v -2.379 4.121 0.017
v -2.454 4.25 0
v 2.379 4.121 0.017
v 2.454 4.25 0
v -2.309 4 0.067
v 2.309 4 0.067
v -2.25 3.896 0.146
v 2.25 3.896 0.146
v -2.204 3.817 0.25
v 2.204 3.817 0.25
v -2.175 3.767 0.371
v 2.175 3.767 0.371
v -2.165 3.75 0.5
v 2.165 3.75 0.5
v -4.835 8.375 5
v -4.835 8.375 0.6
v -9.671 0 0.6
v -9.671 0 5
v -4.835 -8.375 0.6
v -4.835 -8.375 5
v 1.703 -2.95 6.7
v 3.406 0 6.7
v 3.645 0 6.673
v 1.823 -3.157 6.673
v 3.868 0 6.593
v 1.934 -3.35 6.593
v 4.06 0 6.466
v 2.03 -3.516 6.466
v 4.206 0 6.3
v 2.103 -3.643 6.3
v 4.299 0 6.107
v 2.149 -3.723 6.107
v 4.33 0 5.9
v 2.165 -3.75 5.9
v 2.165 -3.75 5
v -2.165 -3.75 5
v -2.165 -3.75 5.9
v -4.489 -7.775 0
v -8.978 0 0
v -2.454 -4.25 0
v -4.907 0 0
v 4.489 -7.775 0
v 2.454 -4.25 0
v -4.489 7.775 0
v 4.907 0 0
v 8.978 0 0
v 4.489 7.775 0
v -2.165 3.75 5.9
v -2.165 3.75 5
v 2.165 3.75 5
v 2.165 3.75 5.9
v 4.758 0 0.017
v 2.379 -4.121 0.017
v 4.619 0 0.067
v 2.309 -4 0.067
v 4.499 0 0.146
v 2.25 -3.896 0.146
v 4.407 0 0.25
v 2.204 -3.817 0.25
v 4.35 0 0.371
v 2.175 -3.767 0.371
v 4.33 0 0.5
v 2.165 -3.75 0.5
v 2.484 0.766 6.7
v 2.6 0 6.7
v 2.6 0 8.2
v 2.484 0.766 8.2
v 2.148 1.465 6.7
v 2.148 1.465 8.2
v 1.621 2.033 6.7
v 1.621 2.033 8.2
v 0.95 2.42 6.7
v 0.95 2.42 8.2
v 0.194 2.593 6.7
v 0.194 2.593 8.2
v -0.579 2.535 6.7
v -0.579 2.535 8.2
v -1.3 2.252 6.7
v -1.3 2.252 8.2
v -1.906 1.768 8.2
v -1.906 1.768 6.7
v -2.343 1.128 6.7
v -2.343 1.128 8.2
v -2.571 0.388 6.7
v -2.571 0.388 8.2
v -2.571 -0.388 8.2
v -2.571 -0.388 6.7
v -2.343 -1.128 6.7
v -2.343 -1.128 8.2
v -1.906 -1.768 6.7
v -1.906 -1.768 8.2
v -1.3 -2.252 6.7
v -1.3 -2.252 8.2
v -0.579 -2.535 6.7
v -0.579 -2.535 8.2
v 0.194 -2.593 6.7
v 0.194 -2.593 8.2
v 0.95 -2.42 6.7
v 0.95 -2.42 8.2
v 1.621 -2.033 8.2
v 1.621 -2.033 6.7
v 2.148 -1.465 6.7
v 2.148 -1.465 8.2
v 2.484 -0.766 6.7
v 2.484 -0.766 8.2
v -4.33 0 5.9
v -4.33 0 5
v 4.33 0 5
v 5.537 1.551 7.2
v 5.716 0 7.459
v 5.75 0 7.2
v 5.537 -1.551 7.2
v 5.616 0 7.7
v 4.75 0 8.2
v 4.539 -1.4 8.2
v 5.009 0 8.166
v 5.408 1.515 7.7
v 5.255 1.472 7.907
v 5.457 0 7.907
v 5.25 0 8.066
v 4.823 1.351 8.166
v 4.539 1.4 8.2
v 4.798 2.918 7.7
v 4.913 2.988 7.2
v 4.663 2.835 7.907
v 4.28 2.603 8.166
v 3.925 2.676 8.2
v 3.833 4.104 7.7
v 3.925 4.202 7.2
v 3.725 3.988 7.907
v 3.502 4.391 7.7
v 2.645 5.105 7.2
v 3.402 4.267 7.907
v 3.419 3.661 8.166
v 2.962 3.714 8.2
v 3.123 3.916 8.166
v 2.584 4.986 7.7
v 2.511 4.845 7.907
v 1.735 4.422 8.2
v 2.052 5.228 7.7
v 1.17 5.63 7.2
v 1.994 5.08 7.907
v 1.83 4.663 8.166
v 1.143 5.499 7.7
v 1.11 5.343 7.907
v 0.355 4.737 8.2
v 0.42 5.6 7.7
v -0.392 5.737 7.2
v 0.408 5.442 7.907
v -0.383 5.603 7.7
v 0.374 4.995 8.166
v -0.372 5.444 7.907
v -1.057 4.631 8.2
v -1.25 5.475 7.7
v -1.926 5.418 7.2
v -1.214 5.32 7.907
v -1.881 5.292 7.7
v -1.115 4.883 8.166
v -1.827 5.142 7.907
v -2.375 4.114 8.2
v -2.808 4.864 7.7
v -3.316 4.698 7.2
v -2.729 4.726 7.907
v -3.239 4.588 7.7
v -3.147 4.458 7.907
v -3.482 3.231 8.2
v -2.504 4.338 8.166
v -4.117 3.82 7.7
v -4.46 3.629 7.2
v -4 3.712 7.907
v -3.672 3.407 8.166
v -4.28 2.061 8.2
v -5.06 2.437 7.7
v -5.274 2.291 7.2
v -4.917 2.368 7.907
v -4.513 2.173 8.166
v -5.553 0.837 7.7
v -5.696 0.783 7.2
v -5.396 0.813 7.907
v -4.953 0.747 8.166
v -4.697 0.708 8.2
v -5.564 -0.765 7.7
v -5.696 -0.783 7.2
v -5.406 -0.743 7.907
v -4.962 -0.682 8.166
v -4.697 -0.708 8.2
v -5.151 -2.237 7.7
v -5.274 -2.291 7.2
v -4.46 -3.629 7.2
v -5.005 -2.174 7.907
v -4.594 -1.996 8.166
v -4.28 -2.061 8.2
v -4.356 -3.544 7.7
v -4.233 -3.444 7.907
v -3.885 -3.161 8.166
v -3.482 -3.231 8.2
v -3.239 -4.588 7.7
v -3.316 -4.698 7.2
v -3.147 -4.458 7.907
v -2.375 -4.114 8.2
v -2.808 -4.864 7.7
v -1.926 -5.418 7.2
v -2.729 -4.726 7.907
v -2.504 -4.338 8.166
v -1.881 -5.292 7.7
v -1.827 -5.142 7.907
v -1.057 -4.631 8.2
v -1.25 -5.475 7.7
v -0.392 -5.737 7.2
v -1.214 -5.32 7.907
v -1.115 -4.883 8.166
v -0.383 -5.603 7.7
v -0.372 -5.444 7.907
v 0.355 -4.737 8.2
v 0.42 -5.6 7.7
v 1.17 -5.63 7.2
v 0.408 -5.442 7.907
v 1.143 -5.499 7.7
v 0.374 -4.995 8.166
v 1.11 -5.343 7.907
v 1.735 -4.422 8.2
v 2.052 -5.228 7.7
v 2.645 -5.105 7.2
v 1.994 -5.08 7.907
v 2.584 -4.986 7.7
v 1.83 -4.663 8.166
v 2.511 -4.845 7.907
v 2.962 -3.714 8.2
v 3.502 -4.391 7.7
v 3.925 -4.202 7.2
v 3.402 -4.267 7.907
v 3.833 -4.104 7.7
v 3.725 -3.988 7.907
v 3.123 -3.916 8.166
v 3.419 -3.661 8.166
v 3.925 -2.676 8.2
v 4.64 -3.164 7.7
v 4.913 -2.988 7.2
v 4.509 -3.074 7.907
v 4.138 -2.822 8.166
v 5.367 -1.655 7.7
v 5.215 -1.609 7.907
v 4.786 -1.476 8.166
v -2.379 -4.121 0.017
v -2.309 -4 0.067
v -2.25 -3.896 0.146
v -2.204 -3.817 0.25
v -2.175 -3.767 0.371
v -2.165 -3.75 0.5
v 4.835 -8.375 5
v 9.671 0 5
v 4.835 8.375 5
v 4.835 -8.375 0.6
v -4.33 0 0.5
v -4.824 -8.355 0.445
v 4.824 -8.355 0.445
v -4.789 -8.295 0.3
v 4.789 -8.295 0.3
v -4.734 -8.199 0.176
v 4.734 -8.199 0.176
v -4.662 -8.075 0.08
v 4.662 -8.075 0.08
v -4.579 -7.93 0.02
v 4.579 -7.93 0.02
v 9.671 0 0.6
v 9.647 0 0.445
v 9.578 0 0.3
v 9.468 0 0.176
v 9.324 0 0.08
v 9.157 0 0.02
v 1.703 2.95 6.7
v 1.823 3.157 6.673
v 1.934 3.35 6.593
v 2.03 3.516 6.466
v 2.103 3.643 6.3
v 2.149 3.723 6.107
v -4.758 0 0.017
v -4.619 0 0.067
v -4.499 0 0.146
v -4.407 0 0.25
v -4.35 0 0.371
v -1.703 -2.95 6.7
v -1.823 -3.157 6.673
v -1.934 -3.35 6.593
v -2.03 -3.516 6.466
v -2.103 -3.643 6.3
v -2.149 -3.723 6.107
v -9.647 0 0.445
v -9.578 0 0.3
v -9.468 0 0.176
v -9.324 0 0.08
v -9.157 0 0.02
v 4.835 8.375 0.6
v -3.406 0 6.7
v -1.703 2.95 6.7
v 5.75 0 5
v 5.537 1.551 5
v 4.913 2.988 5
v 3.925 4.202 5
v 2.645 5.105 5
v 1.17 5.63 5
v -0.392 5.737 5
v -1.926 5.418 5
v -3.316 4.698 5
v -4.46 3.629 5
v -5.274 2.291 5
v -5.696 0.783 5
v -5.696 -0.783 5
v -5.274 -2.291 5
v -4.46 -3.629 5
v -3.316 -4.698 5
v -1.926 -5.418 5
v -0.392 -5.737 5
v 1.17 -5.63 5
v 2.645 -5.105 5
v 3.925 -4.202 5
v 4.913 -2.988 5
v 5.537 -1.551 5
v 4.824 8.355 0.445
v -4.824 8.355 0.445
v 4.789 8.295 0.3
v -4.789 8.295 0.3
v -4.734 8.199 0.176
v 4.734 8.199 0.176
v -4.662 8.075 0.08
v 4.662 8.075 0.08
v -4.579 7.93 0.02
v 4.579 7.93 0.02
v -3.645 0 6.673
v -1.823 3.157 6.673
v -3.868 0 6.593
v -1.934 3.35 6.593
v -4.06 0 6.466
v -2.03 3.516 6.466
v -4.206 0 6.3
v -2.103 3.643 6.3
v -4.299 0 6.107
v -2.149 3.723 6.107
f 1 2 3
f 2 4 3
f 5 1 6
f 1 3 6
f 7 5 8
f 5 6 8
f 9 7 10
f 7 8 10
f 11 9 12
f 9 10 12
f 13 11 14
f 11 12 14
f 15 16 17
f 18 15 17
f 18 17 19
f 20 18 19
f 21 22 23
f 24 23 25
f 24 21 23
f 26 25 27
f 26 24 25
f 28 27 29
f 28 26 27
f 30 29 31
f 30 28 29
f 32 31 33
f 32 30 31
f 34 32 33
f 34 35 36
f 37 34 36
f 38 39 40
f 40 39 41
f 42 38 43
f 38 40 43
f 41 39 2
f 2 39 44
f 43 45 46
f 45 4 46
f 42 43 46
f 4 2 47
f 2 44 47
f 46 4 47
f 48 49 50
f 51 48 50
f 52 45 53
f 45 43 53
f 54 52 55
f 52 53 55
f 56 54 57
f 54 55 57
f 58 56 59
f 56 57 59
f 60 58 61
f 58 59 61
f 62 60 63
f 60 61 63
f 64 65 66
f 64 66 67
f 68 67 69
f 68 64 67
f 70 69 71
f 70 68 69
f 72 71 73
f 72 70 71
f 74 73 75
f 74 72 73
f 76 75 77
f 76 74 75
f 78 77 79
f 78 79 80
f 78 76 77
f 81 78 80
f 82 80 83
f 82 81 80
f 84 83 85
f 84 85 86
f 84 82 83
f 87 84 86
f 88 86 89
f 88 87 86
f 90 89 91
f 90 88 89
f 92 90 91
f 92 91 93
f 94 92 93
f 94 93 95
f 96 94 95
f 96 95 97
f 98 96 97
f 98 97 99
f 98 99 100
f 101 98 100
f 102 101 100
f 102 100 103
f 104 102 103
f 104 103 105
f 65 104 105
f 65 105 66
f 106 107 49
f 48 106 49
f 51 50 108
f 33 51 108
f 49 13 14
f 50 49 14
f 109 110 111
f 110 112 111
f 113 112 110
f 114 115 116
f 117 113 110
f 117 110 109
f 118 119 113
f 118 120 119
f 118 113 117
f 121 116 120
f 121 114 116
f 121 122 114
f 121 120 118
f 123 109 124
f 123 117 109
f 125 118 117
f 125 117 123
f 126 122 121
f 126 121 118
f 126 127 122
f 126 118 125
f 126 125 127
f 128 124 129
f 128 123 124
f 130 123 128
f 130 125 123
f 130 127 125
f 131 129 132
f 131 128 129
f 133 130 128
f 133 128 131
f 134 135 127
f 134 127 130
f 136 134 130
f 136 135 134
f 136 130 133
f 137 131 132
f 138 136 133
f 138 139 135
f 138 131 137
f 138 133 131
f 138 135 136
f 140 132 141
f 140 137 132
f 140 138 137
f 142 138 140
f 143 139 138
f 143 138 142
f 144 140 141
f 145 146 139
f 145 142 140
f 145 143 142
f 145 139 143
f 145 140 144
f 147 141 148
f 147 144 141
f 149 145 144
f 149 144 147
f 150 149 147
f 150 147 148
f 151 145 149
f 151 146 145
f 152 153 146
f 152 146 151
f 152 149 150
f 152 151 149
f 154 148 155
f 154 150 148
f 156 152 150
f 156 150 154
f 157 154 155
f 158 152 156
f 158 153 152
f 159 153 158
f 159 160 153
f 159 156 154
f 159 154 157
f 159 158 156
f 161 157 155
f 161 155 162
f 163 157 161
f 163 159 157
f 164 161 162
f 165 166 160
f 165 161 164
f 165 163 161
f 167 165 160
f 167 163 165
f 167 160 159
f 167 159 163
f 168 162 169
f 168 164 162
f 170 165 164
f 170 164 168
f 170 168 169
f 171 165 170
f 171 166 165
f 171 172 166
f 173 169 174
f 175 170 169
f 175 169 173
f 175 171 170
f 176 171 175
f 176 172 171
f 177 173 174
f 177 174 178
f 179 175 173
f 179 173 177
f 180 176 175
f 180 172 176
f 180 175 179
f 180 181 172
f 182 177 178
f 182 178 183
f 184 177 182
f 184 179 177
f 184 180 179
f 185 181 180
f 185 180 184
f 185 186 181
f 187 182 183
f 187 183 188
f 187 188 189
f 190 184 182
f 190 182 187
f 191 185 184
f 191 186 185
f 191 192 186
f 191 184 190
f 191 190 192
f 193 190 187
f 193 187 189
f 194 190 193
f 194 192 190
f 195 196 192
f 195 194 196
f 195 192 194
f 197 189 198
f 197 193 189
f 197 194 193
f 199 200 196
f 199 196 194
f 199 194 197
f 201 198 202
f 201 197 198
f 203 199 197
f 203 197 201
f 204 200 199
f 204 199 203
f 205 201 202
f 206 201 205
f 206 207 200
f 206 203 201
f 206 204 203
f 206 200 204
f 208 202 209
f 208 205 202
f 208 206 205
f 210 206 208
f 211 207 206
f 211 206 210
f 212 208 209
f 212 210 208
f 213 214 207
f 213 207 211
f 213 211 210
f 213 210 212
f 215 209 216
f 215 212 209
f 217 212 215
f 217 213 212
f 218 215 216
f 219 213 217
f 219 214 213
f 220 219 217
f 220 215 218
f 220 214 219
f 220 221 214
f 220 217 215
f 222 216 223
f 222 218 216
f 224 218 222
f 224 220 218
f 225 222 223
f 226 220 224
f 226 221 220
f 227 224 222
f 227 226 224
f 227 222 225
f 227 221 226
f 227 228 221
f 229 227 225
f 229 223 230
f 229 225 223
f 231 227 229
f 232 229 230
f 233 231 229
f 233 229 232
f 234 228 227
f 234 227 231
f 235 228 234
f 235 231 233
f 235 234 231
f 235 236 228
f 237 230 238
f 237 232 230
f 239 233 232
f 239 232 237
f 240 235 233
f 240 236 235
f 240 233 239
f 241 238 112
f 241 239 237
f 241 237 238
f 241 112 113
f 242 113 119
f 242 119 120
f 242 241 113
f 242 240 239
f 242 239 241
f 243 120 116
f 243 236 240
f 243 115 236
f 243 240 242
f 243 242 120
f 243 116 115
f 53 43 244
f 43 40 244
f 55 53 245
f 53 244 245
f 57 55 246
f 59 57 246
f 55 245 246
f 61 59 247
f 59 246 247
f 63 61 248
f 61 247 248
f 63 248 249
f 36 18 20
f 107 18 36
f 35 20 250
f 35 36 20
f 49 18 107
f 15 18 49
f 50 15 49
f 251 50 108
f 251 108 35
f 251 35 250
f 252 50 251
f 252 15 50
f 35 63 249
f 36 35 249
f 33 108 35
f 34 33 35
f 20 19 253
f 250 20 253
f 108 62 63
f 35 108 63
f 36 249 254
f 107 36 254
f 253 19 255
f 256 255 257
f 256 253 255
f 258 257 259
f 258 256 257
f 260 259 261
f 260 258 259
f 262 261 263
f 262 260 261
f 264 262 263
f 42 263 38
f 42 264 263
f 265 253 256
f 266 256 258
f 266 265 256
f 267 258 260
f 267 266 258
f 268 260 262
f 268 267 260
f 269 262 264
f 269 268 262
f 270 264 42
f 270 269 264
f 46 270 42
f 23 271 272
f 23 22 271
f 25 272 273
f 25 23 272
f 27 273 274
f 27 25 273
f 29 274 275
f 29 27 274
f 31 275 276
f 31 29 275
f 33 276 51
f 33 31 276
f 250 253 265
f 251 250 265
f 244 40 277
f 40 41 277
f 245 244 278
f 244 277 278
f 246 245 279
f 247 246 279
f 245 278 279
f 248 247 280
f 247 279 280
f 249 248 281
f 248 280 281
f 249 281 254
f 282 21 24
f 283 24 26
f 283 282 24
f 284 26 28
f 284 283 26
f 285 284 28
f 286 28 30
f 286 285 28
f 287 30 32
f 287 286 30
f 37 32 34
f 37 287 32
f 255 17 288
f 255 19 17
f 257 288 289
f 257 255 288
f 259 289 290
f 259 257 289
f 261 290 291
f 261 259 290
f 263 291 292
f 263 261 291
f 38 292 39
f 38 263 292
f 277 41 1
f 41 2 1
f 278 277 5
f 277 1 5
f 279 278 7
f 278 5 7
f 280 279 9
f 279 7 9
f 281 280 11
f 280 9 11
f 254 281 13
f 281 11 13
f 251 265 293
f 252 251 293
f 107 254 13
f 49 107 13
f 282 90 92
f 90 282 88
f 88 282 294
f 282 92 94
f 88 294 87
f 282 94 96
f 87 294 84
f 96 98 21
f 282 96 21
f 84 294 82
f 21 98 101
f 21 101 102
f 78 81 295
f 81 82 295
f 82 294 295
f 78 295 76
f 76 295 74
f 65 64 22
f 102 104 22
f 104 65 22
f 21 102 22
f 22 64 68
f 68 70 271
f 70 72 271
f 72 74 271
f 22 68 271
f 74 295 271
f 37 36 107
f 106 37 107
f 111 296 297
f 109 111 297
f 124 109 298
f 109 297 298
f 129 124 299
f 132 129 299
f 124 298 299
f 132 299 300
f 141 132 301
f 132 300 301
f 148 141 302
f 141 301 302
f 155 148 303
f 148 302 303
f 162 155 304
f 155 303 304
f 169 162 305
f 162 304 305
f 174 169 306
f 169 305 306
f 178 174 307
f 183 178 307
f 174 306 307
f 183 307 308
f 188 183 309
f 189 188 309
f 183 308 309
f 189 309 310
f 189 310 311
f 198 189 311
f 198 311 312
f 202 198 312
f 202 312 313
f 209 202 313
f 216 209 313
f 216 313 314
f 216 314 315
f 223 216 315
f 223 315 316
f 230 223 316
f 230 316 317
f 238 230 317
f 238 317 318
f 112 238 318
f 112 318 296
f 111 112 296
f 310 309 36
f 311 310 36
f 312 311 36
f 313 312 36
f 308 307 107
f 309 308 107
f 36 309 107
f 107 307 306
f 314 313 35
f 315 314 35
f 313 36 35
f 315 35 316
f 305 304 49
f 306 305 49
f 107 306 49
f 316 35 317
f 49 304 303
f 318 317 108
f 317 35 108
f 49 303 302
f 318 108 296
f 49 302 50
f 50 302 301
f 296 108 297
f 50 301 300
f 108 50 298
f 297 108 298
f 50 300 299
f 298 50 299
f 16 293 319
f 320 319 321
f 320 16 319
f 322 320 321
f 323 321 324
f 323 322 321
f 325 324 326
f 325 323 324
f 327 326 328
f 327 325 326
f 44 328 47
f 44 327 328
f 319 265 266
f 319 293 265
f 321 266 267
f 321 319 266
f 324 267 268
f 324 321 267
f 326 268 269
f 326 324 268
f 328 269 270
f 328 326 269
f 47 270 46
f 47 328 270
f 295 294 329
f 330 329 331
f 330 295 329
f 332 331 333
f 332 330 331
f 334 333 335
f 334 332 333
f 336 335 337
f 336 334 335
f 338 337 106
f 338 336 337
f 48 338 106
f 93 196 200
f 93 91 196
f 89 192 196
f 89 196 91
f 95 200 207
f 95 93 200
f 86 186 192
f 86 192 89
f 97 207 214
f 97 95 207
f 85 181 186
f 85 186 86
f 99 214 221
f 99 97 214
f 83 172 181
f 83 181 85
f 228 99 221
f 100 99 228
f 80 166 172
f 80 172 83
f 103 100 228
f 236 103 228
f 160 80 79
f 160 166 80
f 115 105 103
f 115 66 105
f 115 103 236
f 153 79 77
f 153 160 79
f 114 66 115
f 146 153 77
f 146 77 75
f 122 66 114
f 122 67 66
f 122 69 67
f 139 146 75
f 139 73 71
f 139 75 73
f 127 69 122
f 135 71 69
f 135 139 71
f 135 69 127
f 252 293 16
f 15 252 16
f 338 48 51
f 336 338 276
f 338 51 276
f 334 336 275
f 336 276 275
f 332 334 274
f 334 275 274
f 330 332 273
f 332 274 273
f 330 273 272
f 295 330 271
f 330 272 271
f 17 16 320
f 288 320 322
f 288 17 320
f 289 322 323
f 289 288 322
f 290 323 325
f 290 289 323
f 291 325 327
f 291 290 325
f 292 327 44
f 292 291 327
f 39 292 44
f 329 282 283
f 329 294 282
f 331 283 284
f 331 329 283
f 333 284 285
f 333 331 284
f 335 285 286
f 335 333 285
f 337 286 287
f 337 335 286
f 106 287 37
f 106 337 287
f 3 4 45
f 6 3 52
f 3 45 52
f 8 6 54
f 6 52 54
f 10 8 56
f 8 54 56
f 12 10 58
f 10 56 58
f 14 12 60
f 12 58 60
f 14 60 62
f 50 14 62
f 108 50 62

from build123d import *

# Parameters (mm, degrees)
F1_DEPTH = 5
F2_R     = 5.75
F3_DEPTH = 1.2
F4_R     = 5.75
F4_R_2   = 2.6
F5_DEPTH = 2
F7_R     = 1
F8_R     = 0.6
F9_DEPTH = 0.5
F10_R    = 0.8
F11_R    = 0.5


with BuildPart() as f1:
    # F0 (on Top) → F1 (new body)
    with BuildSketch(Plane.XY):
        Polygon((4.8353085045, -8.375), (9.6706170089, 0), (4.8353085045, 8.375), (-4.8353085045, 8.375), (-9.6706170089, 0), (-4.8353085045, -8.375), align=None)
        Polygon((2.1650635095, 3.75), (4.3301270189, 0), (2.1650635095, -3.75), (-2.1650635095, -3.75), (-4.3301270189, 0), (-2.1650635095, 3.75), align=None, mode=Mode.SUBTRACT)
    extrude(amount=F1_DEPTH)

    # F8
    f8_edges = [f1.edges().sort_by_distance(p)[0] for p in [
        (-7.252963, -4.1875, 0),
        (-7.252963, 4.1875, 0),
        (0, 8.375, 0),
        (7.252963, 4.1875, 0),
        (7.252963, -4.1875, 0),
        (0, -8.375, 0),
    ]]
    fillet(f8_edges, radius=F8_R)

    # F11
    f11_edges = [f1.edges().sort_by_distance(p)[0] for p in [
        (3.247595, -1.875, 0),
        (3.247595, 1.875, 0),
        (0, 3.75, 0),
        (-3.247595, 1.875, 0),
        (0, -3.75, 0),
        (-3.247595, -1.875, 0),
    ]]
    fillet(f11_edges, radius=F11_R)


with BuildPart() as f3:
    # F2 (on face) → F3 (new body)
    with BuildSketch(Plane.XY.offset(5)):
        Circle(F2_R)
        Polygon((-2.1650635095, 3.75), (2.1650635095, 3.75), (4.3301270189, 0), (2.1650635095, -3.75), (-2.1650635095, -3.75), (-4.3301270189, 0), align=None, mode=Mode.SUBTRACT)
    extrude(amount=F3_DEPTH)

    # F4 (on face) → F5 (join)
    with BuildSketch(Plane.XY.offset(6.2)):
        Circle(F4_R)
        Polygon((-2.1650635095, -3.75), (-4.3301270189, 0), (-2.1650635095, 3.75), (2.1650635095, 3.75), (4.3301270189, 0), (2.1650635095, -3.75), align=None, mode=Mode.SUBTRACT)
        Polygon((-2.1650635095, 3.75), (-4.3301270189, 0), (-2.1650635095, -3.75), (2.1650635095, -3.75), (4.3301270189, 0), (2.1650635095, 3.75), align=None)
        Circle(F4_R_2, mode=Mode.SUBTRACT)
    extrude(amount=F5_DEPTH)

    # F7
    f7_edges = [f3.edges().sort_by_distance(p)[0] for p in [
        (-5.75, 0, 8.2),
    ]]
    fillet(f7_edges, radius=F7_R)

    # F9 (cut): a face of the model
    f9_faces = [f3.faces().sort_by_distance(p)[0] for p in [
        (-3.14837959, 1.8177178038, 6.2),
    ]]
    extrude(f9_faces, amount=-F9_DEPTH, mode=Mode.SUBTRACT)

    # F10
    f10_edges = [f3.edges().sort_by_distance(p)[0] for p in [
        (3.247595, -1.875, 6.7),
        (3.247595, 1.875, 6.7),
        (0, -3.75, 6.7),
        (-3.247595, -1.875, 6.7),
        (-3.247595, 1.875, 6.7),
        (0, 3.75, 6.7),
    ]]
    fillet(f10_edges, radius=F10_R)


solid = Compound([f1.part, f3.part])
